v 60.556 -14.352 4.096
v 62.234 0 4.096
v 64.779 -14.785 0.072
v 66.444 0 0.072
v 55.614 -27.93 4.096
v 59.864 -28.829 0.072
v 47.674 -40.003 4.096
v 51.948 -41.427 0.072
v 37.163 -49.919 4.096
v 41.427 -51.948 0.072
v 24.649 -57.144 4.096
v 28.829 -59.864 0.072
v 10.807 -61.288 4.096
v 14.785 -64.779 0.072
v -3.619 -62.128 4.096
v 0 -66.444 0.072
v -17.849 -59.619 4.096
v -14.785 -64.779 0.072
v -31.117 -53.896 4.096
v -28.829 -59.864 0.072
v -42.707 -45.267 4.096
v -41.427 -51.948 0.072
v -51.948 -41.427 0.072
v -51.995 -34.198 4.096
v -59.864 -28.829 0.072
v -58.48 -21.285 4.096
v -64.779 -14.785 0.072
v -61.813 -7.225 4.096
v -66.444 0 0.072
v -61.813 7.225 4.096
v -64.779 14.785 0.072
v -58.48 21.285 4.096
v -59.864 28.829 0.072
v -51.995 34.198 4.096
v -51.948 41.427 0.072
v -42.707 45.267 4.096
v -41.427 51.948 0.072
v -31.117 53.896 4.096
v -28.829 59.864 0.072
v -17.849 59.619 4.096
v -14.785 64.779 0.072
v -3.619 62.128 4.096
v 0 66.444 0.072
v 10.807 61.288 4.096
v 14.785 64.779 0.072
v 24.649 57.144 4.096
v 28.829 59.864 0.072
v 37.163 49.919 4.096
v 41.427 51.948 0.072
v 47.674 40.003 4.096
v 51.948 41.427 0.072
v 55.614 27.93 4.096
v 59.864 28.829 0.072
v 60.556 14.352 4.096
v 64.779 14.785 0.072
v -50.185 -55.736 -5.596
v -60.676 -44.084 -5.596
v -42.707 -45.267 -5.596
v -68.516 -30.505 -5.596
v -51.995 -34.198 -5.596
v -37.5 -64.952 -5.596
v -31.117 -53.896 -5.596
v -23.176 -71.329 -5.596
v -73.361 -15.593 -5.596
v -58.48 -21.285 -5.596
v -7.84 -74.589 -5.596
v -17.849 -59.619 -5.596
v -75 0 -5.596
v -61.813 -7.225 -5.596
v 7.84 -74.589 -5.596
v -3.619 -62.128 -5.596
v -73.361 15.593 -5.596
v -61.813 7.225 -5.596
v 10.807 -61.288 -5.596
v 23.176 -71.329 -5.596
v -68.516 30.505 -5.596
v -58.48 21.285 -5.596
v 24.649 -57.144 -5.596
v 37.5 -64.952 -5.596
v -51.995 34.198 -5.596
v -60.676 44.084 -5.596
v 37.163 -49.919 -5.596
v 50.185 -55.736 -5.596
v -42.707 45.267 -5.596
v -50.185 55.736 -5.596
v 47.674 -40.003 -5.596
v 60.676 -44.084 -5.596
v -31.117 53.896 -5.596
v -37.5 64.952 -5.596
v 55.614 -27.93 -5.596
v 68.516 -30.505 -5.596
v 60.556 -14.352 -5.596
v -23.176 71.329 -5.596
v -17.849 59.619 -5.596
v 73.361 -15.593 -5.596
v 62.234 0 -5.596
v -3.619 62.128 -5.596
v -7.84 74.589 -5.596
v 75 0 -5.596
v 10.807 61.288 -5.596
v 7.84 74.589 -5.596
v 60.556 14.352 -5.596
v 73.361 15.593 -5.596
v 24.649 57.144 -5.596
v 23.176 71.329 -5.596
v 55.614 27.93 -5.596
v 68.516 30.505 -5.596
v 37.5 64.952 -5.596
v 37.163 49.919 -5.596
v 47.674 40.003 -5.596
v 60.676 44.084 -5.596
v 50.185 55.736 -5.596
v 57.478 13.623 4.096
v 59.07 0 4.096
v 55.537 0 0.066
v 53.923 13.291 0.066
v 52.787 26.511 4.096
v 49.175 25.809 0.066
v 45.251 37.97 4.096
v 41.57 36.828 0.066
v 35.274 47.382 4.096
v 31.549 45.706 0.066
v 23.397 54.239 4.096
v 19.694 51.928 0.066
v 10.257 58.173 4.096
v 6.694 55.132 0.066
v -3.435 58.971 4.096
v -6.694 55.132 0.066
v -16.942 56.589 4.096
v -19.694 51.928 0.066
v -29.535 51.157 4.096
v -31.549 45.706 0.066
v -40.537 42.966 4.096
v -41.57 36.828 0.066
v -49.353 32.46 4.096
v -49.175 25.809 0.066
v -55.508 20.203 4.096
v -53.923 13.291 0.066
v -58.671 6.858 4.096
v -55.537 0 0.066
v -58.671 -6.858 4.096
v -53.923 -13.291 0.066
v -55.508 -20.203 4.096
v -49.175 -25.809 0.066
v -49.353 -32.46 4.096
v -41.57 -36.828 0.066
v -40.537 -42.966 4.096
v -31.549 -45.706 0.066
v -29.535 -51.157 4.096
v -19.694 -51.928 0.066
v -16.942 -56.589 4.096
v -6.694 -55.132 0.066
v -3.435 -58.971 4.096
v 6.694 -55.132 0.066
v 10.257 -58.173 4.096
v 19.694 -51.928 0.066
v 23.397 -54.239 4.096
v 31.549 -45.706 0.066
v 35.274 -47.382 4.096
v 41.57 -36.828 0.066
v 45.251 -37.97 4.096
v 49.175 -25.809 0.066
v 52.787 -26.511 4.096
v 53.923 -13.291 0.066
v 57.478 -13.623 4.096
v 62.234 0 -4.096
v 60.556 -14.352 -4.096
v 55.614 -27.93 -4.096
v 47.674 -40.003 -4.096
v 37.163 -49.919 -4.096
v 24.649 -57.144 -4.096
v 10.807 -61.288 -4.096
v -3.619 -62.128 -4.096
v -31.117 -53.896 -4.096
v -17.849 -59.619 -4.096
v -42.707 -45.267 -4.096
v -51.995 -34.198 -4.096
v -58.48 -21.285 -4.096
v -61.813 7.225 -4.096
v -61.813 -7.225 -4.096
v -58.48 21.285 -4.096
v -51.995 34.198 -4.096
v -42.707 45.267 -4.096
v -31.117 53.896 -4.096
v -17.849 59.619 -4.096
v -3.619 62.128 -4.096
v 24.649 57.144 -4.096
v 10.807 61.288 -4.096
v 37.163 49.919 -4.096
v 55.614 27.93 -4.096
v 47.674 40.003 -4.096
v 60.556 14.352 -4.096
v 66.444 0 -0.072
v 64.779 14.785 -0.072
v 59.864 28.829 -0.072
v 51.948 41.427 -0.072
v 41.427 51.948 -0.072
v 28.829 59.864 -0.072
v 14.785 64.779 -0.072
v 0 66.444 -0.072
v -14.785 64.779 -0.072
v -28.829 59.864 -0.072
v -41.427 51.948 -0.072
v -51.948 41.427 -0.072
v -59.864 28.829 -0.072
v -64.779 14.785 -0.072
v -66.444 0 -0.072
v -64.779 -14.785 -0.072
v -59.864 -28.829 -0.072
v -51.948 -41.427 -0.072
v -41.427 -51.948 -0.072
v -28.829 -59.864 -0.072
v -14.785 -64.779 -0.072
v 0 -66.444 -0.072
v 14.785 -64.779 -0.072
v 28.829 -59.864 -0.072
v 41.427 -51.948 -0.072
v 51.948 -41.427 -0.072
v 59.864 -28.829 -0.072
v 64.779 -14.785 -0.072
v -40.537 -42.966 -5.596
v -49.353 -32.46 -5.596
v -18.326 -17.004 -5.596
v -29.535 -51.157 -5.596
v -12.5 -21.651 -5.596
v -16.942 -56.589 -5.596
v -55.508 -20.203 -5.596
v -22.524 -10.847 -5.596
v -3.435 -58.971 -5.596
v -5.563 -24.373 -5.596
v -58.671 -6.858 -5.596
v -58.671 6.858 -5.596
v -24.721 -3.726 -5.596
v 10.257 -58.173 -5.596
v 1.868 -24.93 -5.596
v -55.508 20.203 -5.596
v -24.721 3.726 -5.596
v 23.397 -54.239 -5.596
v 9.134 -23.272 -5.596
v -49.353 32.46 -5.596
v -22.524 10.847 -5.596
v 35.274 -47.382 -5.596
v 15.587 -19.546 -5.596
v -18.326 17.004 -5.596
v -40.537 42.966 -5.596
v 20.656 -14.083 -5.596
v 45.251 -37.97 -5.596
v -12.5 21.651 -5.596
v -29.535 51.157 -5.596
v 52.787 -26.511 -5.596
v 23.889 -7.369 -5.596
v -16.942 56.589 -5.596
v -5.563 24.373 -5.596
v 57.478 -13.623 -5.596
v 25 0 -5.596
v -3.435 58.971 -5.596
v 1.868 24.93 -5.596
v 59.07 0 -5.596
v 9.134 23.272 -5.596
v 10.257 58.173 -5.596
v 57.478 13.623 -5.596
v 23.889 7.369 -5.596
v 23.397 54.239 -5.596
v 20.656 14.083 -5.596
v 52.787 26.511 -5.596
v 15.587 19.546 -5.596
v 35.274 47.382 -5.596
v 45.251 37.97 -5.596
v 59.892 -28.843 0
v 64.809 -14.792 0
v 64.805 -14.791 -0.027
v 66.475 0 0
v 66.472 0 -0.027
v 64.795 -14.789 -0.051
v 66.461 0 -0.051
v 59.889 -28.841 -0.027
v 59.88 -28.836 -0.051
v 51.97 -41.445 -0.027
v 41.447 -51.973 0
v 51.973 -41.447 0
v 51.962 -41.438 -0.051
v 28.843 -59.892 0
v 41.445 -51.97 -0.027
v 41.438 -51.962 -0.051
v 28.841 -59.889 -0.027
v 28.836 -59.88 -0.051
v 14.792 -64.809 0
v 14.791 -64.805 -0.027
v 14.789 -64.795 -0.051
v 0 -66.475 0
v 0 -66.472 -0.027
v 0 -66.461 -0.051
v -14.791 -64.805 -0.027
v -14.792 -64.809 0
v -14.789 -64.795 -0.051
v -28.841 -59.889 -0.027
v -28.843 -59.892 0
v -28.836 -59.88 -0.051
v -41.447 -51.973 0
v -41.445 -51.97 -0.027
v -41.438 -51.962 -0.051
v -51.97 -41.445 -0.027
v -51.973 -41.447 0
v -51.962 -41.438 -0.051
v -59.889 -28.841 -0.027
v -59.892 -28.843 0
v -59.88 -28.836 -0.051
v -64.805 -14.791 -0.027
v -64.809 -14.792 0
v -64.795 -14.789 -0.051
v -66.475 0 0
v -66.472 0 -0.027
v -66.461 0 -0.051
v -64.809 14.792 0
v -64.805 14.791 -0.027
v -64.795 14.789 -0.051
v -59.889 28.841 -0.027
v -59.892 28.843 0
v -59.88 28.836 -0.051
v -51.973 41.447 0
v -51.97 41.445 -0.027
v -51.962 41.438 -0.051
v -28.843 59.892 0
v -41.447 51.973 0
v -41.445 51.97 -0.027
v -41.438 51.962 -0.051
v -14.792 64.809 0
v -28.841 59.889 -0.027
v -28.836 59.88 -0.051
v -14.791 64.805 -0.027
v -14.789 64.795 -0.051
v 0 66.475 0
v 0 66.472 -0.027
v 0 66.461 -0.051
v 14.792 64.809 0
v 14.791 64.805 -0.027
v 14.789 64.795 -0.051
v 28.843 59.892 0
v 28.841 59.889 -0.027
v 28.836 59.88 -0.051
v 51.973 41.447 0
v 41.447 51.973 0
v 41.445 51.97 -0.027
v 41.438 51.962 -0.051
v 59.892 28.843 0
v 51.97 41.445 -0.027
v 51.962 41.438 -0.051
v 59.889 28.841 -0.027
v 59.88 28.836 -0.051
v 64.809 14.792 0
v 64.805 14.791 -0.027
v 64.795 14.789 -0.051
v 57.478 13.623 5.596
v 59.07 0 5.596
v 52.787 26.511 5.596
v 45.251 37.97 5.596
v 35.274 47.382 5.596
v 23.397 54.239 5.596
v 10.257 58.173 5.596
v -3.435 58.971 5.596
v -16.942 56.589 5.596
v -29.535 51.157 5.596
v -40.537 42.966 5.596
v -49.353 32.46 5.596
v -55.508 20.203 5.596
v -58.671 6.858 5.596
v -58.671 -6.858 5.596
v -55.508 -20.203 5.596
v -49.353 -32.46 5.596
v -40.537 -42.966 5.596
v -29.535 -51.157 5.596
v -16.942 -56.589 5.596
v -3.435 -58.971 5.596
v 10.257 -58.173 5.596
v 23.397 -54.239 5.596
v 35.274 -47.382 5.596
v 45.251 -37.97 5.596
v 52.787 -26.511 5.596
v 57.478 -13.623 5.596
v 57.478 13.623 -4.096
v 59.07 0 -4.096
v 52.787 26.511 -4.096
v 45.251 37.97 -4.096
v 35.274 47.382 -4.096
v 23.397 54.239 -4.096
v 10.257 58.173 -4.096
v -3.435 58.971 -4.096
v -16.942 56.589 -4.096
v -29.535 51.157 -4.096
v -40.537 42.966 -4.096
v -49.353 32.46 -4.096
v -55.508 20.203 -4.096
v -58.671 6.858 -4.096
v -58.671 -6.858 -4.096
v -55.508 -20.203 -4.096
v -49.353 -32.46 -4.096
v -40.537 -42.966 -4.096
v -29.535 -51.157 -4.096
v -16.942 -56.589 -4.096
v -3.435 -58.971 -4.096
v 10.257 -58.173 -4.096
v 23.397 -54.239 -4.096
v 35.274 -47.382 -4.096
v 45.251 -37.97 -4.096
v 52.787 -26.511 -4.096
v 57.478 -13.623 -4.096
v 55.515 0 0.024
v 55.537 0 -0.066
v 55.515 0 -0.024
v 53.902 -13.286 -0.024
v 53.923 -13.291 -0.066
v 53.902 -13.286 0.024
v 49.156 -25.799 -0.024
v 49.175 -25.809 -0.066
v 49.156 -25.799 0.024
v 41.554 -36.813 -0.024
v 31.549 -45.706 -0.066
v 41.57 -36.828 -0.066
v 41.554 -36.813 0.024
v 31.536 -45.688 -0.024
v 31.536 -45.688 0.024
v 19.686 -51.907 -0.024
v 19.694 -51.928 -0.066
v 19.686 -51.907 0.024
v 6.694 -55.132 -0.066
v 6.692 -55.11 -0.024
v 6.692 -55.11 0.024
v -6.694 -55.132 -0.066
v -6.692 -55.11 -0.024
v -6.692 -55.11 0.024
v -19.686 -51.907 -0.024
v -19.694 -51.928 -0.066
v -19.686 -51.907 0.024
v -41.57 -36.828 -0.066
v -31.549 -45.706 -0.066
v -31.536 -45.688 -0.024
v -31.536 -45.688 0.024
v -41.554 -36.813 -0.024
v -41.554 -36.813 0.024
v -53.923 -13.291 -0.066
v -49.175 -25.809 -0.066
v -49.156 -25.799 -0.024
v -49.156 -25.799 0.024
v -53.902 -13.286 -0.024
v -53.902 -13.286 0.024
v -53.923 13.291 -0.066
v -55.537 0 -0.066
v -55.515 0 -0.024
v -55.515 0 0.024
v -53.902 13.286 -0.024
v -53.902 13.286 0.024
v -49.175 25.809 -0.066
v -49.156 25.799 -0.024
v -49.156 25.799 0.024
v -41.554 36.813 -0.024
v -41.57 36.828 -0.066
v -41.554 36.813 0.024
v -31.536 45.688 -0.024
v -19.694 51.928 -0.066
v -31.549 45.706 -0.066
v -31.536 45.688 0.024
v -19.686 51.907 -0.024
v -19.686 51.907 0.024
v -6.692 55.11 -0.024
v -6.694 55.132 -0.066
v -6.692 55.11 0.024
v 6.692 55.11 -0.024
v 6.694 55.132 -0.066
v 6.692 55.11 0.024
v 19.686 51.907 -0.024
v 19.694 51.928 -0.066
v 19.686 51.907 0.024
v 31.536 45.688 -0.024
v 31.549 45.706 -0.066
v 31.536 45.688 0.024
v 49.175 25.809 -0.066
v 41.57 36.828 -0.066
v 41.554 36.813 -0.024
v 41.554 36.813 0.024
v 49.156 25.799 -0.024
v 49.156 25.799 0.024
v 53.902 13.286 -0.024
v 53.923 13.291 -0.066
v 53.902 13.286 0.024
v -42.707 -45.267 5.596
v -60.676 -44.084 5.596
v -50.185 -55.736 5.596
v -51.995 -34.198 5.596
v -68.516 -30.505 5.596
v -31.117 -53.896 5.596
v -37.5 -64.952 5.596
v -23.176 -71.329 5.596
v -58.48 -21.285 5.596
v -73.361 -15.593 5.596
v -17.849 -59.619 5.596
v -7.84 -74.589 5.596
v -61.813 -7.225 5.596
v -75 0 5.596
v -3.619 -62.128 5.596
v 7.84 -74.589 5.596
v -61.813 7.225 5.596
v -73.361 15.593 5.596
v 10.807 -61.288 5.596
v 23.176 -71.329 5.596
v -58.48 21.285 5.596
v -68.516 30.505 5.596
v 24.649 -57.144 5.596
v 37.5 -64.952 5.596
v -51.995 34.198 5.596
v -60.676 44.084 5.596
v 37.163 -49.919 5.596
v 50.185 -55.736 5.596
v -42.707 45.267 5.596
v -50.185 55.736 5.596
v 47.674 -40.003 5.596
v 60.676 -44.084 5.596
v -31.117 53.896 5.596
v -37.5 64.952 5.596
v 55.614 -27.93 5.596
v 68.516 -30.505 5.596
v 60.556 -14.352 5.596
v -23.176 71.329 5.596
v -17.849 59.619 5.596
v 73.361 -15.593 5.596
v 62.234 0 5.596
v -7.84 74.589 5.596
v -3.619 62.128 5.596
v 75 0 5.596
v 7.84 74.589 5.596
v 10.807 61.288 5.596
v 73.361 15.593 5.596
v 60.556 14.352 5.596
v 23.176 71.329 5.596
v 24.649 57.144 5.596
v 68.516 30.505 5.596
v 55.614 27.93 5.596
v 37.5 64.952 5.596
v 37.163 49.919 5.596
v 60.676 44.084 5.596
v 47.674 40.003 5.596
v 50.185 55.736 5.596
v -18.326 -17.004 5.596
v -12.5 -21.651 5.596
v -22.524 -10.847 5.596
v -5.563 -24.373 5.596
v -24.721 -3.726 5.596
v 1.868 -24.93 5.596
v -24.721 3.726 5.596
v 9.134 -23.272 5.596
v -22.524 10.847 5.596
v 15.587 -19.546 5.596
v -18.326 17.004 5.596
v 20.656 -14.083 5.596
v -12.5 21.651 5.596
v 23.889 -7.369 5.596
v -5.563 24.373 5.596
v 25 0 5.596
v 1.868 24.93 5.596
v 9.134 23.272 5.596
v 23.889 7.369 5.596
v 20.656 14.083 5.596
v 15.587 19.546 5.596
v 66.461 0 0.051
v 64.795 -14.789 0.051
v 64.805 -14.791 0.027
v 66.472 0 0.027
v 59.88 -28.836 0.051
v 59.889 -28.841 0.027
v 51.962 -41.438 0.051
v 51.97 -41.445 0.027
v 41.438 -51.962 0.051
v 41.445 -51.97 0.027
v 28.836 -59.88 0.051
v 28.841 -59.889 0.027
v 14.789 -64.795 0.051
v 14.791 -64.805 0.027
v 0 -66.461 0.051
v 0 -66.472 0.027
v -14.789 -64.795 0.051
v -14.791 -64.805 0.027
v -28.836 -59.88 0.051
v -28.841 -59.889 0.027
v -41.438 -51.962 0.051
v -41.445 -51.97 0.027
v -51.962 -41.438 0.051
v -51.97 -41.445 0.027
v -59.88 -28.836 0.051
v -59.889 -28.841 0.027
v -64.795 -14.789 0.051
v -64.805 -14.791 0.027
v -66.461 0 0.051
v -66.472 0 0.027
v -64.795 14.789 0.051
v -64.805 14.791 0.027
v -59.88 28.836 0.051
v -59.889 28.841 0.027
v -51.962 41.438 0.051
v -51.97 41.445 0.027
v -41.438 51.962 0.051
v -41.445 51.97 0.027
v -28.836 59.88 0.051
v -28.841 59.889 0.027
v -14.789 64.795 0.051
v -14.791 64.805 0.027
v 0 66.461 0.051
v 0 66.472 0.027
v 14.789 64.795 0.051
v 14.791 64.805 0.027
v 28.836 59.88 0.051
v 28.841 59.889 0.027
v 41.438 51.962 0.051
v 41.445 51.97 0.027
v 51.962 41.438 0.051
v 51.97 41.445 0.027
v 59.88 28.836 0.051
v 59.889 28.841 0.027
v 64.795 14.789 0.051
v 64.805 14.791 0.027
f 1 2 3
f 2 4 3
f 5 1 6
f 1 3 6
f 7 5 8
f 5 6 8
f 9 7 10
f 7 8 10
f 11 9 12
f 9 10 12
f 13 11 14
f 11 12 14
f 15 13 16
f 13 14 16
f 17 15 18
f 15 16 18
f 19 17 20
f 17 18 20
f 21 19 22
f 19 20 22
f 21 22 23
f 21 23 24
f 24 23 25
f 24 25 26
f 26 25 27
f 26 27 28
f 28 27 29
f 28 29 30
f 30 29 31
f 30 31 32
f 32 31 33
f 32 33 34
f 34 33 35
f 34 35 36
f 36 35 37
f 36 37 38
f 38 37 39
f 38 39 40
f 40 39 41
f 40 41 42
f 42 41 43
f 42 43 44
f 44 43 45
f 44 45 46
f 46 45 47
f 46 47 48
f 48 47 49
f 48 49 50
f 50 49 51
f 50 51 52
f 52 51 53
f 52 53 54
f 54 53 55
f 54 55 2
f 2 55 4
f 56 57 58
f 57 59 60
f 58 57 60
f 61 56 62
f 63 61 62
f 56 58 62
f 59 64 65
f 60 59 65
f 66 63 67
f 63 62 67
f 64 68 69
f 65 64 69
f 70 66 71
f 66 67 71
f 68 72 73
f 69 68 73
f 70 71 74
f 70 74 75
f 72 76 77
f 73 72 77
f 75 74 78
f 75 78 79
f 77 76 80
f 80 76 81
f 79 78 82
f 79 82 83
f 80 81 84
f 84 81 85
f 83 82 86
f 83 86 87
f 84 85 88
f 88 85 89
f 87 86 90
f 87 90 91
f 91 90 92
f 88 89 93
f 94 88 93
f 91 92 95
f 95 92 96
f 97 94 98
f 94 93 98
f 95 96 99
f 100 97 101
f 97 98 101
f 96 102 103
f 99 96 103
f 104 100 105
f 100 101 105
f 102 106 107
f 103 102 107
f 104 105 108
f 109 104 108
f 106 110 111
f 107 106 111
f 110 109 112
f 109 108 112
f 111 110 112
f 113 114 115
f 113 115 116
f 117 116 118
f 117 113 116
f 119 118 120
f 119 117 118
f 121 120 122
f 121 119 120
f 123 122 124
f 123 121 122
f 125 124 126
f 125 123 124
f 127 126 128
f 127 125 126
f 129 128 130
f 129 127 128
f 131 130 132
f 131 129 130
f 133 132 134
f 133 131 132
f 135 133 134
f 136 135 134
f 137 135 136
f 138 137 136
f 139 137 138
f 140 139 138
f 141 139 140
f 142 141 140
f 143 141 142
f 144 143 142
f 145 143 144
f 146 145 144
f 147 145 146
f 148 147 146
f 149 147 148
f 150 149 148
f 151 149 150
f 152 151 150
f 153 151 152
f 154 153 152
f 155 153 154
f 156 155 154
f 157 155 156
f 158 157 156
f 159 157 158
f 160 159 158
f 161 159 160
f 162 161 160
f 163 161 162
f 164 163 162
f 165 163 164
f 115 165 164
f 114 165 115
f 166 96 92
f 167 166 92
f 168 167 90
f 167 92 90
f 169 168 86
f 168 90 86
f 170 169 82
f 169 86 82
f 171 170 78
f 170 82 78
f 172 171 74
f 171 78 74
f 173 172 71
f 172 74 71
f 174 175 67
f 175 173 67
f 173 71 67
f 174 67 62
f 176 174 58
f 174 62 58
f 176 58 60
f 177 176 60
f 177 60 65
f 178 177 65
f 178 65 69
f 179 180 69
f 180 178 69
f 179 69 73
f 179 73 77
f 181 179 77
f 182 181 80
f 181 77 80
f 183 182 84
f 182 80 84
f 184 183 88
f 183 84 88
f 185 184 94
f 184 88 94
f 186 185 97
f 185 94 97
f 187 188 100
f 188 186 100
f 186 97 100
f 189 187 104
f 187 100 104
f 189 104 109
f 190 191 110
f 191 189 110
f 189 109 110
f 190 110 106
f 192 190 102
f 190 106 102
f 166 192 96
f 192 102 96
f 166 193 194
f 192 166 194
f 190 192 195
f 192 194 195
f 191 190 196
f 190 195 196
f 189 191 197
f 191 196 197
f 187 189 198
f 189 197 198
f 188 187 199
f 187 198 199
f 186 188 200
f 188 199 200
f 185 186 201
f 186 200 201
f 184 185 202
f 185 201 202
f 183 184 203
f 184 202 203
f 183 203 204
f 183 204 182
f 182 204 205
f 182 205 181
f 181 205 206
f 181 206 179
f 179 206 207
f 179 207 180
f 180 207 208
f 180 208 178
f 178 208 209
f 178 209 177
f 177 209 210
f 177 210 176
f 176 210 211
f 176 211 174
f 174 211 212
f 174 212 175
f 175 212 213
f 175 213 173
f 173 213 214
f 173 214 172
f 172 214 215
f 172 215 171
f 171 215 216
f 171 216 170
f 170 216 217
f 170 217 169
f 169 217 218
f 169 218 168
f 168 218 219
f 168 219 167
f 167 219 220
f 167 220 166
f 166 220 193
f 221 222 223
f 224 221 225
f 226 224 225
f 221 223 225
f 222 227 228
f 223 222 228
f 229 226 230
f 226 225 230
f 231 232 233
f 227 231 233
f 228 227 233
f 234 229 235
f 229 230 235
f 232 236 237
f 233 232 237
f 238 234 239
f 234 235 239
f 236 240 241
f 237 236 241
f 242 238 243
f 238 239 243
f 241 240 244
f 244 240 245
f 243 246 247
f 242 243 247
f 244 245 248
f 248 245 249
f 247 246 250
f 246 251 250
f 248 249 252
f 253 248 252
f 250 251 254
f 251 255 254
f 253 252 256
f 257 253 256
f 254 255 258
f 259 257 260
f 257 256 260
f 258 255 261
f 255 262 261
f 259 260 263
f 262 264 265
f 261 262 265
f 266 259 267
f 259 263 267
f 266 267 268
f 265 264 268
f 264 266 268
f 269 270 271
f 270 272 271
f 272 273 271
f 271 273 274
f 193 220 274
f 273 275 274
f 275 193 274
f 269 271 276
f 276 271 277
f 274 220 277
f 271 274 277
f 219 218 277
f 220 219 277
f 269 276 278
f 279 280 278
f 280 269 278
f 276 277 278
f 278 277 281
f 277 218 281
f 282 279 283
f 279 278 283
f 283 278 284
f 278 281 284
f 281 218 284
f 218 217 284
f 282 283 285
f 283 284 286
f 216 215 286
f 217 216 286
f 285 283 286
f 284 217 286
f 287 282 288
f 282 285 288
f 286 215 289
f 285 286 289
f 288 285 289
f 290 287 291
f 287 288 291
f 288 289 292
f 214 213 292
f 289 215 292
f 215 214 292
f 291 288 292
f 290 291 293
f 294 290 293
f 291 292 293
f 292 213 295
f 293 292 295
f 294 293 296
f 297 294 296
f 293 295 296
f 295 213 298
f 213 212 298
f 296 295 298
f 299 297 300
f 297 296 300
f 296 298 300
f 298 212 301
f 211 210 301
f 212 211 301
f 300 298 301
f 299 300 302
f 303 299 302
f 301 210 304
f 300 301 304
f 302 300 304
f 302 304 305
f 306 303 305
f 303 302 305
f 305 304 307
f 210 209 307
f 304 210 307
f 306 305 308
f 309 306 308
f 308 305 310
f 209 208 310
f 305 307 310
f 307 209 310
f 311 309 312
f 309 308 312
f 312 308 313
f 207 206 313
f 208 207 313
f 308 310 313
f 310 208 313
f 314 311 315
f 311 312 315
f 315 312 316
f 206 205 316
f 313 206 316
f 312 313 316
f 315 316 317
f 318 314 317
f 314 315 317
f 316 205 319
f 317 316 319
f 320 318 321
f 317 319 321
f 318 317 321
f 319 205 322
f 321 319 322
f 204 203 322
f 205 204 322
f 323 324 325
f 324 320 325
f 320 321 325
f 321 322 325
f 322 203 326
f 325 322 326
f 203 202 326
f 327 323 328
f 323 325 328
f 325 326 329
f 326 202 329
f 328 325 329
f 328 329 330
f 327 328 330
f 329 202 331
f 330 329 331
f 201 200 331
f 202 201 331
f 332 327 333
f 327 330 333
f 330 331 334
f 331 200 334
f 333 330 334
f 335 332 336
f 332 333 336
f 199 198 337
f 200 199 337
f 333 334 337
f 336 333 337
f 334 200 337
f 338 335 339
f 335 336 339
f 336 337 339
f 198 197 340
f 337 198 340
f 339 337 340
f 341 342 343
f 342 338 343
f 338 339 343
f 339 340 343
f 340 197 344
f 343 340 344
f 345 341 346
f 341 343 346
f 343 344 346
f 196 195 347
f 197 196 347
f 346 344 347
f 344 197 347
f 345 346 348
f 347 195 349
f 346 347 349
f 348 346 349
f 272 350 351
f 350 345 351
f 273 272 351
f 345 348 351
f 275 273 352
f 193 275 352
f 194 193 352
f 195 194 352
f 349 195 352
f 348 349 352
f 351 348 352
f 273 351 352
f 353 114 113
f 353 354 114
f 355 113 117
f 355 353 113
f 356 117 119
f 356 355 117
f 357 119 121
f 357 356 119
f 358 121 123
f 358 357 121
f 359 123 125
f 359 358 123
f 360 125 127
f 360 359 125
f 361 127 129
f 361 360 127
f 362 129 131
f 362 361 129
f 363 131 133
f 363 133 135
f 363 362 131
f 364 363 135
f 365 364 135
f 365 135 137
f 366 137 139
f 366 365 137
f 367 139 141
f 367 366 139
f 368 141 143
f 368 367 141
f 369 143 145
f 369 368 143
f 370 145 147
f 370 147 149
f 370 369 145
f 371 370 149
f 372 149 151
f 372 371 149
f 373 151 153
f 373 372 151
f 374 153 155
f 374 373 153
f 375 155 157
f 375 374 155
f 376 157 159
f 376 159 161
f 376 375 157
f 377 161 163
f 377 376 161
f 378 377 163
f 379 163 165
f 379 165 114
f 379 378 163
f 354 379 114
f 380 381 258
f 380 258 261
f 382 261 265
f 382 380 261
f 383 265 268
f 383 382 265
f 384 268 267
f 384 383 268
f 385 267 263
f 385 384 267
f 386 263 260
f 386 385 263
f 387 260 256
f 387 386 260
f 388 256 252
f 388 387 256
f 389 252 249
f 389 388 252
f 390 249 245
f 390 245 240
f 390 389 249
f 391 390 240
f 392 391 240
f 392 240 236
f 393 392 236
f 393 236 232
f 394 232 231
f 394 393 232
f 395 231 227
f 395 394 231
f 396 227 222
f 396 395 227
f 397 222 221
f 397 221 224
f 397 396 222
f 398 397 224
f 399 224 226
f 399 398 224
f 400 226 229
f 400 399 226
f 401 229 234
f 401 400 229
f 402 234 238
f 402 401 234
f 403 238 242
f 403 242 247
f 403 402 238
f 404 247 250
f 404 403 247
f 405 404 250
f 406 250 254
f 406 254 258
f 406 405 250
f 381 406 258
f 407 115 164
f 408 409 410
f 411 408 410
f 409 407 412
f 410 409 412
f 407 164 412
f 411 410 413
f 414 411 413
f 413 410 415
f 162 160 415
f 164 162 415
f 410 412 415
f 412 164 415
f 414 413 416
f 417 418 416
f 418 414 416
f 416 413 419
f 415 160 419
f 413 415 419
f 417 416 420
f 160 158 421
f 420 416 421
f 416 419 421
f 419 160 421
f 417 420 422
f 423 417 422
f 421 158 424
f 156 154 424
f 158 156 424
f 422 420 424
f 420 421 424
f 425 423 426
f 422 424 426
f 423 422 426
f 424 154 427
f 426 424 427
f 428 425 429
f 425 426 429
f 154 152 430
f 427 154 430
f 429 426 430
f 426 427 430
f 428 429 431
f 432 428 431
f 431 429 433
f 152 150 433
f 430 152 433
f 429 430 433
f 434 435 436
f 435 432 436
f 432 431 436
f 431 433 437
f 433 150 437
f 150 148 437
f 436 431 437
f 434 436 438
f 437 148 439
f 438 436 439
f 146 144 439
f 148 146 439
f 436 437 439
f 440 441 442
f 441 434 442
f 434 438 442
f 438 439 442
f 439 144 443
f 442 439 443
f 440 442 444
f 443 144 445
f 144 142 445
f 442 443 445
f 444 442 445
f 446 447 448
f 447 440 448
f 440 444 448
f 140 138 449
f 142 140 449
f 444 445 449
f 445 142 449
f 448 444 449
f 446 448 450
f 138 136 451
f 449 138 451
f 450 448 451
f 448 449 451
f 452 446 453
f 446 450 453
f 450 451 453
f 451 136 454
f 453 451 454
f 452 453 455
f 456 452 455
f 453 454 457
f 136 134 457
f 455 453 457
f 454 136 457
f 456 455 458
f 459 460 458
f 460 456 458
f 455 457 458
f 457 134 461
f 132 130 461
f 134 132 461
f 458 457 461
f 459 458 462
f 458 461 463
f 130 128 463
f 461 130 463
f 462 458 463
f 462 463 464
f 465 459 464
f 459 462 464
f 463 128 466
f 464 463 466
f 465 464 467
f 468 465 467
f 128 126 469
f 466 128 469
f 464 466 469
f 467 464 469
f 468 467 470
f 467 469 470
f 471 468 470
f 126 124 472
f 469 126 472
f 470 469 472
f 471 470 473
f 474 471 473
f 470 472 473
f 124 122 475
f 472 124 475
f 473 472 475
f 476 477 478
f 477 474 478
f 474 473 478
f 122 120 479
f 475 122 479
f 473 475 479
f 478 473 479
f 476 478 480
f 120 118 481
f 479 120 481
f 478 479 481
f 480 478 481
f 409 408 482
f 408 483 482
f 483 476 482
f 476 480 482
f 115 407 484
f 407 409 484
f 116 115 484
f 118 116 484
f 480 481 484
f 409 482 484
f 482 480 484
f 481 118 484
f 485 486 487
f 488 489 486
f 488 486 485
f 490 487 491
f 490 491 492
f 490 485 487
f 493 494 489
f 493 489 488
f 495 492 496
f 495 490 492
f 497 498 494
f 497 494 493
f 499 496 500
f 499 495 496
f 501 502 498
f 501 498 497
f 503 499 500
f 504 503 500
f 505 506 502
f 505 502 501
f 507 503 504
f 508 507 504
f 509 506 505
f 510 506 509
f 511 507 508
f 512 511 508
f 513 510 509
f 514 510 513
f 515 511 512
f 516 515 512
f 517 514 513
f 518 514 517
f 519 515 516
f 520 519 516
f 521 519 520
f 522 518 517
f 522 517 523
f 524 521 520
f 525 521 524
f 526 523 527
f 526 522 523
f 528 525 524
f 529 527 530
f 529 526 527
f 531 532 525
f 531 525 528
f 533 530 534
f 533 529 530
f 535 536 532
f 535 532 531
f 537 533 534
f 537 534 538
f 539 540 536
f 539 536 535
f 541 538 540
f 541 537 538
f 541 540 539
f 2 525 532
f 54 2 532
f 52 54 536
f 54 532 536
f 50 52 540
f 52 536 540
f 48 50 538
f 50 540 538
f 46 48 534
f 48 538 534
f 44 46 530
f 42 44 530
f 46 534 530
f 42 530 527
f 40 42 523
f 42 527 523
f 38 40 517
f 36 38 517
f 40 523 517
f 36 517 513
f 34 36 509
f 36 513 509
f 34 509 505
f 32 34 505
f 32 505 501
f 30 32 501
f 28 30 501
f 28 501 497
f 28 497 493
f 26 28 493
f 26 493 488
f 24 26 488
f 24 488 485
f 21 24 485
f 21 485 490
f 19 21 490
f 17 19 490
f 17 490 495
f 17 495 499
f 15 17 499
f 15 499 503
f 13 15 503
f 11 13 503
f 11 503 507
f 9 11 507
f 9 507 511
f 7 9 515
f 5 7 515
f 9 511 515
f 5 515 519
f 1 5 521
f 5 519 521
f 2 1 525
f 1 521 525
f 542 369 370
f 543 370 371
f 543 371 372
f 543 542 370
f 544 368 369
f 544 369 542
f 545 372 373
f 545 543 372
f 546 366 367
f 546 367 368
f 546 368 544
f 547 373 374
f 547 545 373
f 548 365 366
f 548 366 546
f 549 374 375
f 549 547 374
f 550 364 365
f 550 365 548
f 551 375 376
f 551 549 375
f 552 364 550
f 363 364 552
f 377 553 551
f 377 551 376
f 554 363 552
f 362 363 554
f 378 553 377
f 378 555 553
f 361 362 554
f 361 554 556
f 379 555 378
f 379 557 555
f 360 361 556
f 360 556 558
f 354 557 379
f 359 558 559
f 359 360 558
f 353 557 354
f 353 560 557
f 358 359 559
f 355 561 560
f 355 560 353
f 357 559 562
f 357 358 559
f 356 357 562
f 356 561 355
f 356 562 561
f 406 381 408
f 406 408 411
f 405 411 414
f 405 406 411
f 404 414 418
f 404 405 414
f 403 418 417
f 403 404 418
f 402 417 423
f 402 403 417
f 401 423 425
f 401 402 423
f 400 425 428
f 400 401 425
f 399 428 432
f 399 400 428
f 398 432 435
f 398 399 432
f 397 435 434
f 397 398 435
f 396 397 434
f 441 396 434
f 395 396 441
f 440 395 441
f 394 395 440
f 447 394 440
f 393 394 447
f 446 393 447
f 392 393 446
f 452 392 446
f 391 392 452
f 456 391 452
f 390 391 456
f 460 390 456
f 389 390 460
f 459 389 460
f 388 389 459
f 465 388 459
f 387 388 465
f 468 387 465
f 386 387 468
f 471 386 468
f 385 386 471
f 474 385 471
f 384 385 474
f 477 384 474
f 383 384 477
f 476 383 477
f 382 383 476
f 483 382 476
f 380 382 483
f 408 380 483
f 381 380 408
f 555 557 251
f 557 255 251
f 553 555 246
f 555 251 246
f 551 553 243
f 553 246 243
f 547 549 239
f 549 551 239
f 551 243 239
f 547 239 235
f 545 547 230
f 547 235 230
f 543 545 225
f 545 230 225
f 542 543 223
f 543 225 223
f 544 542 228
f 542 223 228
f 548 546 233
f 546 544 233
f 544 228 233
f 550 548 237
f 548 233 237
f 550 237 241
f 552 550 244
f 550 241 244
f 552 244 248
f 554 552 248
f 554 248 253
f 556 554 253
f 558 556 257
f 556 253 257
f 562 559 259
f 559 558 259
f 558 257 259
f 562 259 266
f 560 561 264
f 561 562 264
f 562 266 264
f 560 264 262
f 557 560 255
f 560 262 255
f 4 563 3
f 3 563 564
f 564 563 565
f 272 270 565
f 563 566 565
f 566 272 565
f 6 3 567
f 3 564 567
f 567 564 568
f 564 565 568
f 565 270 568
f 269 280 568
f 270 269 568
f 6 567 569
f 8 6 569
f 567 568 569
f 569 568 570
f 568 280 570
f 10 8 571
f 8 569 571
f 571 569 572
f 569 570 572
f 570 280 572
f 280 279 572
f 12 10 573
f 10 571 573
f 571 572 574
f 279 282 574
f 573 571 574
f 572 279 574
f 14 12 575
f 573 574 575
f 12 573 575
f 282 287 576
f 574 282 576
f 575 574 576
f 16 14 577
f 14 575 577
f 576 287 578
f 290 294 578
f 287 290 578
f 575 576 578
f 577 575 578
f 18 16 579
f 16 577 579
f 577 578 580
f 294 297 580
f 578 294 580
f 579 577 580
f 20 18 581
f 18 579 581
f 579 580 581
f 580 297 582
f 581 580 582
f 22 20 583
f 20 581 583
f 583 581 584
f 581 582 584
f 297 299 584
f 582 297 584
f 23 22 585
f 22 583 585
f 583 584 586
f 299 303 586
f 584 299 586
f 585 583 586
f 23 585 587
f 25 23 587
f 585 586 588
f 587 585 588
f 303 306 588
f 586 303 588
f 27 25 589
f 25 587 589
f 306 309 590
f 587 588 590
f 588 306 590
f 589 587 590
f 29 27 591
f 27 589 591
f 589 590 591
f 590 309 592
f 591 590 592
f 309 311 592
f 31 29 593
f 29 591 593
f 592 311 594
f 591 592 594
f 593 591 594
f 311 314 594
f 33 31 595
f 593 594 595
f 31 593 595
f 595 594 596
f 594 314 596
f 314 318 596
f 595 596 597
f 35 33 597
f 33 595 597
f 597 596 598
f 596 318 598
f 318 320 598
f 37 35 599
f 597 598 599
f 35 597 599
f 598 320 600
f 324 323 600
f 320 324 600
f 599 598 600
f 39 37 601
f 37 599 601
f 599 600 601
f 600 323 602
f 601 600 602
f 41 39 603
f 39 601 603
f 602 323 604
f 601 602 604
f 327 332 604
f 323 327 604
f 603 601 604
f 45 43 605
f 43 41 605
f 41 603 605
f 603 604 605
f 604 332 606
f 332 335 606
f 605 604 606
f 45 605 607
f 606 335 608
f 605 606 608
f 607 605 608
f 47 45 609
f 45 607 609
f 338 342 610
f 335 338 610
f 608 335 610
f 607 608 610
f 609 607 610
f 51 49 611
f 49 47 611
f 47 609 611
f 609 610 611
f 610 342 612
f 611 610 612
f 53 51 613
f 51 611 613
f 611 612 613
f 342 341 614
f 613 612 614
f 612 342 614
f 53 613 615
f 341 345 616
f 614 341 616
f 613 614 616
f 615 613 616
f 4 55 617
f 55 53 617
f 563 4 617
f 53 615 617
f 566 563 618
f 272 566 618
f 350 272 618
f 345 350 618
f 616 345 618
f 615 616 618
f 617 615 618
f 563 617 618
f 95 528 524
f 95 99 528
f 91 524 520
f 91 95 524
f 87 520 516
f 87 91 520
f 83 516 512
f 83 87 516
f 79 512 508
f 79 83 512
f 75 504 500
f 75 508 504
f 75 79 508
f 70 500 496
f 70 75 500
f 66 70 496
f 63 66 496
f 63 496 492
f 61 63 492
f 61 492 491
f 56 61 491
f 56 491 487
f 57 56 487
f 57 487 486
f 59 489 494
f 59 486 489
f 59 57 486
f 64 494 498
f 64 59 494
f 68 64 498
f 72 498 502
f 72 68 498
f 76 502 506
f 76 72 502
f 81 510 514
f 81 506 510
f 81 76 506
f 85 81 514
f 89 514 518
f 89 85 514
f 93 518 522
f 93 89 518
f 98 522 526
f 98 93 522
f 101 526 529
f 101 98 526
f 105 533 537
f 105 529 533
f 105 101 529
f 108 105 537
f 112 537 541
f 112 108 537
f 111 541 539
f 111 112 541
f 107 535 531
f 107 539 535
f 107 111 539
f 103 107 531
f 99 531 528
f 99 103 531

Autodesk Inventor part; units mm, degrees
ref_plane "YZ Plane" through (0, 0, 0) normal (1, 0, 0) x (0, 1, 0)
ref_plane "XZ Plane" through (0, 0, 0) normal (0, 1, 0) x (-1, 0, 0)
sketch "Sketch7" plane through (0, 0, 0) normal (0, 1, 0) x (-1, 0, 0)
  line L0 (0, 0) -> (0, 63.4182)
  line L1 (0, 0) -> (-60.766, 0) construction
  line L2 (0, 63.4182) -> (-60.766, 0) construction
  line L3 (0, 63.4182) -> (-66.3755, 0) construction
  line L4 (0, 63.4182) -> (-60.5189, -5.5956) construction
  line L5 (0, 0) -> (0, -63.4182)
  line L6 (0, -63.4182) -> (-60.766, 0) construction
  line L7 (0, -63.4182) -> (-66.3755, 0) construction
  line L8 (0, -63.4182) -> (-60.5189, 5.5956) construction
  line L9 (-60.5189, 5.5956) -> (-66.3755, 0) construction
  line L10 (-55.6121, 0) -> (-64.3632, -8.3612) construction
  line L11 (-55.6121, 0) -> (-39.6464, -15.2543) construction
  line L12 (0, -88.9988) -> (0, 125.9803) projected
  line L13 (-53.5, -5.9919) -> (-53.5, 6.008)
  line L14 (83.2786, 0) -> (-105.9214, 0) projected
  line L15 (-63.5667, 2.6836) -> (-57.9653, -2.6836) construction
  line L16 (-57.9653, 2.6836) -> (-63.5667, -2.6836) construction
  line L17 (-26.151, -15.9303) -> (-40.3783, -15.9303) construction
  line L18 (-40.3783, -15.9303) -> (-40.3783, -12.7539) construction
  line L19 (-40.3783, -12.7539) -> (-26.151, -12.7539) construction
  line L20 (-26.151, -12.7539) -> (-26.151, -15.9303) construction
  point P0 (-53.5, 0)
  dimension "Roller_Side_difference" = -0.164
  dimension "d90" = 63.4182
  dimension "d201" = 53.5
  dimension "d343" = 92.447
  dimension "d344" = 92.611
  dimension "d367" = 8.1
sketch "Sketch1" plane through (0, 0, 0) normal (0, 0, 1) x (1, 0, 0)
  circle A0 centre (0, 0) radius 60.766 construction
  line L0 (0, 0) -> (60.766, 0)
  line L1 (0, 0) -> (60.766, 4.025)
  line L2 (60.766, 0) -> (60.766, 4.025)
  circle A1 centre (0, 0) radius 53.5
  point P0 (56.8, 0)
  dimension "d56" = 60.766
  dimension "d57" = 4.025
  dimension "d400" = 53.5
  dimension "d531" = 5.5
  dimension "d532" = 5.5
  dimension "d533" = 5.5
  dimension "d537" = 24.5
  dimension "d538" = 3
  dimension "d543" = 5
  dimension "d549" = 3
  dimension "d550" = 3
  dimension "d567" = 5
  dimension "d568" = 5
sketch "Roller1" plane through (0, 0, 0) normal (0, 1, 0) x (-1, 0, 0)
  line L0 (0, 63.4182) -> (-60.5189, -5.5956) construction
  line L1 (0, 63.4182) -> (-66.3755, 0) construction
  line L2 (-55.6121, 0) -> (-39.6464, -15.2543) construction
  line L3 (0, -63.4182) -> (-66.3755, 0) construction
  line L4 (-55.5642, 0.0925) -> (-60.471, -5.5031)
  line L5 (-60.471, -5.5031) -> (-66.285, 0.0519)
  line L6 (-66.285, 0.0519) -> (-60.9033, 5.1938)
  line L7 (-60.9033, 5.1938) -> (-55.5642, 0.0925)
  line L8 (-52.4316, -2.9004) -> (-57.5682, -8.2765)
  line L9 (-53.1547, -2.2096) -> (-58.2912, -7.5857)
  point P0 (0, 0)
  point P1 (-63.378, -2.7256)
  dimension "d345" = 0.025
  dimension "d346" = 0.025
  dimension "d347" = 0.1
  dimension "d348" = 0.1
  dimension "d349" = 272.61
  dimension "d350" = 272.447
  dimension "d357" = 1
  dimension "d369" = 4.0148
sketch "Roller2" plane through (0, 0, 0) normal (0, 1, 0) x (-1, 0, 0)
  line L0 (0, -63.4182) -> (-60.5189, 5.5956) construction
  line L1 (-55.6121, 0) -> (-64.3632, -8.3612) construction
  line L2 (0, -63.4182) -> (-66.3755, 0) construction
  line L3 (0, 63.4182) -> (-66.3755, 0) construction
  line L4 (-60.471, 5.5031) -> (-55.6961, 0.058)
  line L5 (-55.6961, 0.058) -> (-61.048, -5.0555)
  line L6 (-61.048, -5.0555) -> (-66.285, -0.0519)
  line L7 (-66.285, -0.0519) -> (-60.471, 5.5031)
  line L8 (-63.378, 2.7256) -> (-58.3796, -2.5059)
  line L9 (-62.655, 3.4164) -> (-57.6565, -1.8151)
  point P0 (0, 0)
  dimension "d351" = 0.025
  dimension "d352" = 0.025
  dimension "d354" = 0.1
  dimension "d355" = 92.447
  dimension "d356" = 92.611
  dimension "d370" = 0.1
  dimension "d371" = 1
sketch "Sketch22" plane through (0, 0, 0) normal (0, 1, 0) x (-1, 0, 0)
  line L0 (-31.756, 8.0215) -> (-17.5287, 8.0215) construction
  line L1 (-17.5287, 8.0215) -> (-17.5287, 4.8451) construction
  line L2 (-17.5287, 4.8451) -> (-31.756, 4.8451) construction
  line L3 (-31.756, 4.8451) -> (-31.756, 8.0215) construction
  point P0 (0, 0)
  dimension "Roller_Side_difference" = -0.164
sketch "Sketch2" plane through (0, 0, 0) normal (0, 1, 0) x (-1, 0, 0)
  line L0 (0, 0) -> (0, 60.766) construction
  line L1 (0, 0) -> (-60.766, 0) projected
  line L2 (0, 0) -> (0, -60.766)
  line L3 (0, -60.766) -> (-60.766, 0) construction
  line L4 (0, 60.766) -> (-60.766, 0) construction
  line L5 (-78.8928, 100.3938) -> (0, 60.766) construction
  line L6 (-36.7785, 14.3639) -> (0, 60.766) construction
  line L7 (-36.7785, 14.3639) -> (0, -60.766) construction
  line L8 (-39.0257, 11.5288) -> (0, -60.766) construction
  point P0 (-41.1854, 19.5806)
sketch "Sketch23" plane through (0, 0, 0) normal (0, 1, 0) x (-1, 0, 0)
  line L0 (0, -63.4182) -> (-60.5189, 5.5956) construction
  line L1 (0, -63.4182) -> (-66.3755, 0) construction
  line L2 (0, 63.4182) -> (-60.5189, -5.5956) construction
  line L3 (-60.5189, 5.5956) -> (-66.3755, 0) construction
  line L4 (0, 63.4182) -> (-66.3755, 0) construction
  line L5 (-60.5189, 5.5956) -> (-60.5189, -5.5956) construction
  line L6 (83.2786, 0) -> (-105.9214, 0) projected
  line L7 (-59.0705, 4.0956) -> (-55.5369, 0.0659)
  line L8 (-55.5369, -0.0659) -> (-59.0705, -4.0956)
  line L9 (-62.2336, 4.0956) -> (-66.4445, 0.0723)
  line L10 (-66.4445, -0.0723) -> (-62.2336, -4.0956)
  arc A0 (-66.4445, 0.0723) -> (-66.4445, -0.0723) centre (-66.3755, 0) ccw
  arc A1 (-55.5369, -0.0659) -> (-55.5369, 0.0659) centre (-55.6121, 0) ccw
  line L11 (-59.0705, 4.0956) -> (-59.0705, 5.5956)
  line L12 (-59.0705, 5.5956) -> (-25, 5.5956)
  line L13 (-25, 5.5956) -> (-25, -5.5956)
  line L14 (-25, -5.5956) -> (-59.0705, -5.5956)
  line L15 (-59.0705, -5.5956) -> (-59.0705, -4.0956)
  line L16 (-62.2336, 4.0956) -> (-62.2336, 5.5956)
  line L17 (-62.2336, 5.5956) -> (-75, 5.5956)
  line L18 (-75, 5.5956) -> (-75, -5.5956)
  line L19 (-62.2336, -4.0956) -> (-62.2336, -5.5956)
  line L20 (-62.2336, -5.5956) -> (-75, -5.5956)
  line L21 (-60.5189, 5.5956) -> (-60.5189, 5.5956)
  line L22 (-60.5189, -5.5956) -> (-60.5189, -5.5956)
  line L23 (0, -88.9988) -> (0, 125.9803) projected
  line L24 (-66.5202, 0) -> (-75, 0)
  point P0 (0, 0)
  point P1 (-55.4791, 0)
  point P2 (-66.4755, 0)
  point P3 (-75, 0)
  dimension "d378" = 90
  dimension "d379" = 0.1
  dimension "d380" = 0.1
  dimension "d381" = 0.1
  dimension "d382" = 0.1
  dimension "d383" = 0.1
  dimension "d384" = 11.1912
  dimension "d385" = 0
  dimension "d386" = 0
  dimension "d391" = 25
  dimension "d392" = 75
  dimension "d393" = 1.5
  dimension "d394" = 1.5
  dimension "d395" = 1.5
  dimension "d396" = 1.5
revolve "RevRoller1" [suppressed]
fillet "Fillet1" [suppressed]
sketch "Sketch40" plane through (0, 0, -5.5956) normal (0, 0, -1) x (-1, 0, 0)
  circle A0 centre (75, 0) radius 2.5 projected
  circle A1 centre (0, 0) radius 53.5 projected
  point P0 (53.4416, 2.4993)
  point P1 (53.4416, -2.4993)
sketch "Sketch43" plane through (0, 0, 20) normal (0, 0, 1) x (1, 0, 0)
  circle A0 centre (0, 0) radius 14.9199 projected
  circle A1 centre (0, 0) radius 70.1809
  circle A2 centre (0, 0) radius 22.9199
  circle A3 centre (0, 0) radius 21.1699
  circle A4 centre (-21.1699, 0) radius 1.5
  circle A5 centre (21.4375, -37.1308) radius 1.5 projected
  circle A6 centre (15.3125, 26.522) radius 1.5 projected
  circle A7 centre (0, 0) radius 1 projected
  circle A8 centre (15.3125, 26.522) radius 1.5 projected
  line L0 (0, 0) -> (35.0904, 60.7784)
  line L1 (0, 0) -> (35.0904, -60.7784)
  circle A9 centre (-30.625, 0) radius 2.5 projected
  line L2 (-21.1699, -8.7839) -> (-21.1699, 8.7839)
  circle A10 centre (-30.625, 0) radius 4.5
  arc A11 (-30.625, 4.5) -> (-21.1699, 8.7839) centre (-30.3626, 16.4971) ccw
  arc A12 (-21.1699, -8.7839) -> (-30.625, -4.5) centre (-30.3626, -16.4971) ccw
  circle A13 centre (21.1699, 0) radius 1.5
  line L3 (21.1699, 8.7839) -> (21.1699, -8.7839)
  circle A14 centre (30.625, 0) radius 4.5
  arc A15 (30.625, -4.5) -> (21.1699, -8.7839) centre (30.3626, -16.4971) ccw
  arc A16 (21.1699, 8.7839) -> (30.625, 4.5) centre (30.3626, 16.4971) ccw
  point P0 (-30.4819, -4.4977)
  point P1 (-30.4819, 4.4977)
  point P2 (11.46, 19.8492)
  point P3 (14.5625, 25.223)
  point P4 (16.0625, 27.8211)
  point P5 (22.1875, -38.4299)
  point P6 (20.6875, -35.8318)
  point P7 (11.46, -19.8492)
  point P8 (30.4819, -4.4977)
  point P9 (30.4819, 4.4977)
  dimension "d585" = 8
  dimension "d587" = 1.75
  dimension "d589" = 3
  dimension "d592" = 2
  dimension "d593" = 12
  dimension "d594" = 12
  dimension "d597" = 3
  dimension "d598" = 12
  dimension "d599" = 12
pattern_circular "Circular Pattern13" [suppressed]
feature "Move Body7" [suppressed]
revolve "Revolution13" [suppressed]
fillet "Fillet3" [suppressed]
pattern_circular "Circular Pattern14" [suppressed]
feature "Move Body6" [suppressed]
revolve "Revolution14" add sketch "Sketch23" angle 360 about axis through (0, 0, -10) along (0, 0, 1) contours A1 L7 L11 L12 L13 L6 | L6 L13 L14 L15 L8 A1
revolve "OuterRim_Top2" add sketch "Sketch23" angle 360 about axis through (0, 0, -10) along (0, 0, 1) contours L6 A0 L10 L19 L20 L18
revolve "OuterRim_Bottom2" add sketch "Sketch23" angle 360 about axis through (0, 0, -10) along (0, 0, 1) contours L6 L18 L17 L16 L9 A0
sketch "Sketch30" plane through (0, 0, 5.5956) normal (0, 0, 1) x (1, 0, 0)
  circle A0 centre (0, 0) radius 25 projected
  line L0 (0, 0) -> (2.5, 0)
  circle A1 centre (2.5, 0) radius 4
  dimension "d495" = 2.5
  dimension "d496" = 8
ref_plane "Work Plane7" through (0, 0, 100) normal (0, 0, 1) x (1, 0, 0)
sketch "Sketch44" plane through (0, 0, 100) normal (0, 0, 1) x (1, 0, 0)
  circle A0 centre (0, 0) radius 75 projected
  circle A1 centre (0, 0) radius 62.2336 projected
  circle A2 centre (0, 0) radius 59.0705 projected
  circle A3 centre (0, 0) radius 25 projected
  line L0 (0, 0) -> (-18.375, 31.8264) construction
  line L1 (0, -105) -> (0, 105) projected
  circle A4 centre (0, 0) radius 36.75 construction
  dimension "d604" = 73.5
  dimension "d603" = 30
equation "\"Roller_Side_difference\" = -0.163578deg"
equation "\"Cycloid_Top_Plate_Fasner_Inner\" = 61.25"
equation "\"Cycloid_Top_Plate_Fasner_Outer\" = 85.75"
equation "\"Roller_Hole_Radius\" = 1"
equation "\"Distance_To_Bearing\" = 87.83151"
equation "\"Bearing_Roller_Gap_Reduction\" = 0.2"
equation "\"d514\" = 0.2"
equation "\"Side_Bearing_Outer_Diameter\" = 75"
equation "\"Side_Bearing_Inner_Diameter\" = 25"
properties part number "OuterBearingTest_TBS"
